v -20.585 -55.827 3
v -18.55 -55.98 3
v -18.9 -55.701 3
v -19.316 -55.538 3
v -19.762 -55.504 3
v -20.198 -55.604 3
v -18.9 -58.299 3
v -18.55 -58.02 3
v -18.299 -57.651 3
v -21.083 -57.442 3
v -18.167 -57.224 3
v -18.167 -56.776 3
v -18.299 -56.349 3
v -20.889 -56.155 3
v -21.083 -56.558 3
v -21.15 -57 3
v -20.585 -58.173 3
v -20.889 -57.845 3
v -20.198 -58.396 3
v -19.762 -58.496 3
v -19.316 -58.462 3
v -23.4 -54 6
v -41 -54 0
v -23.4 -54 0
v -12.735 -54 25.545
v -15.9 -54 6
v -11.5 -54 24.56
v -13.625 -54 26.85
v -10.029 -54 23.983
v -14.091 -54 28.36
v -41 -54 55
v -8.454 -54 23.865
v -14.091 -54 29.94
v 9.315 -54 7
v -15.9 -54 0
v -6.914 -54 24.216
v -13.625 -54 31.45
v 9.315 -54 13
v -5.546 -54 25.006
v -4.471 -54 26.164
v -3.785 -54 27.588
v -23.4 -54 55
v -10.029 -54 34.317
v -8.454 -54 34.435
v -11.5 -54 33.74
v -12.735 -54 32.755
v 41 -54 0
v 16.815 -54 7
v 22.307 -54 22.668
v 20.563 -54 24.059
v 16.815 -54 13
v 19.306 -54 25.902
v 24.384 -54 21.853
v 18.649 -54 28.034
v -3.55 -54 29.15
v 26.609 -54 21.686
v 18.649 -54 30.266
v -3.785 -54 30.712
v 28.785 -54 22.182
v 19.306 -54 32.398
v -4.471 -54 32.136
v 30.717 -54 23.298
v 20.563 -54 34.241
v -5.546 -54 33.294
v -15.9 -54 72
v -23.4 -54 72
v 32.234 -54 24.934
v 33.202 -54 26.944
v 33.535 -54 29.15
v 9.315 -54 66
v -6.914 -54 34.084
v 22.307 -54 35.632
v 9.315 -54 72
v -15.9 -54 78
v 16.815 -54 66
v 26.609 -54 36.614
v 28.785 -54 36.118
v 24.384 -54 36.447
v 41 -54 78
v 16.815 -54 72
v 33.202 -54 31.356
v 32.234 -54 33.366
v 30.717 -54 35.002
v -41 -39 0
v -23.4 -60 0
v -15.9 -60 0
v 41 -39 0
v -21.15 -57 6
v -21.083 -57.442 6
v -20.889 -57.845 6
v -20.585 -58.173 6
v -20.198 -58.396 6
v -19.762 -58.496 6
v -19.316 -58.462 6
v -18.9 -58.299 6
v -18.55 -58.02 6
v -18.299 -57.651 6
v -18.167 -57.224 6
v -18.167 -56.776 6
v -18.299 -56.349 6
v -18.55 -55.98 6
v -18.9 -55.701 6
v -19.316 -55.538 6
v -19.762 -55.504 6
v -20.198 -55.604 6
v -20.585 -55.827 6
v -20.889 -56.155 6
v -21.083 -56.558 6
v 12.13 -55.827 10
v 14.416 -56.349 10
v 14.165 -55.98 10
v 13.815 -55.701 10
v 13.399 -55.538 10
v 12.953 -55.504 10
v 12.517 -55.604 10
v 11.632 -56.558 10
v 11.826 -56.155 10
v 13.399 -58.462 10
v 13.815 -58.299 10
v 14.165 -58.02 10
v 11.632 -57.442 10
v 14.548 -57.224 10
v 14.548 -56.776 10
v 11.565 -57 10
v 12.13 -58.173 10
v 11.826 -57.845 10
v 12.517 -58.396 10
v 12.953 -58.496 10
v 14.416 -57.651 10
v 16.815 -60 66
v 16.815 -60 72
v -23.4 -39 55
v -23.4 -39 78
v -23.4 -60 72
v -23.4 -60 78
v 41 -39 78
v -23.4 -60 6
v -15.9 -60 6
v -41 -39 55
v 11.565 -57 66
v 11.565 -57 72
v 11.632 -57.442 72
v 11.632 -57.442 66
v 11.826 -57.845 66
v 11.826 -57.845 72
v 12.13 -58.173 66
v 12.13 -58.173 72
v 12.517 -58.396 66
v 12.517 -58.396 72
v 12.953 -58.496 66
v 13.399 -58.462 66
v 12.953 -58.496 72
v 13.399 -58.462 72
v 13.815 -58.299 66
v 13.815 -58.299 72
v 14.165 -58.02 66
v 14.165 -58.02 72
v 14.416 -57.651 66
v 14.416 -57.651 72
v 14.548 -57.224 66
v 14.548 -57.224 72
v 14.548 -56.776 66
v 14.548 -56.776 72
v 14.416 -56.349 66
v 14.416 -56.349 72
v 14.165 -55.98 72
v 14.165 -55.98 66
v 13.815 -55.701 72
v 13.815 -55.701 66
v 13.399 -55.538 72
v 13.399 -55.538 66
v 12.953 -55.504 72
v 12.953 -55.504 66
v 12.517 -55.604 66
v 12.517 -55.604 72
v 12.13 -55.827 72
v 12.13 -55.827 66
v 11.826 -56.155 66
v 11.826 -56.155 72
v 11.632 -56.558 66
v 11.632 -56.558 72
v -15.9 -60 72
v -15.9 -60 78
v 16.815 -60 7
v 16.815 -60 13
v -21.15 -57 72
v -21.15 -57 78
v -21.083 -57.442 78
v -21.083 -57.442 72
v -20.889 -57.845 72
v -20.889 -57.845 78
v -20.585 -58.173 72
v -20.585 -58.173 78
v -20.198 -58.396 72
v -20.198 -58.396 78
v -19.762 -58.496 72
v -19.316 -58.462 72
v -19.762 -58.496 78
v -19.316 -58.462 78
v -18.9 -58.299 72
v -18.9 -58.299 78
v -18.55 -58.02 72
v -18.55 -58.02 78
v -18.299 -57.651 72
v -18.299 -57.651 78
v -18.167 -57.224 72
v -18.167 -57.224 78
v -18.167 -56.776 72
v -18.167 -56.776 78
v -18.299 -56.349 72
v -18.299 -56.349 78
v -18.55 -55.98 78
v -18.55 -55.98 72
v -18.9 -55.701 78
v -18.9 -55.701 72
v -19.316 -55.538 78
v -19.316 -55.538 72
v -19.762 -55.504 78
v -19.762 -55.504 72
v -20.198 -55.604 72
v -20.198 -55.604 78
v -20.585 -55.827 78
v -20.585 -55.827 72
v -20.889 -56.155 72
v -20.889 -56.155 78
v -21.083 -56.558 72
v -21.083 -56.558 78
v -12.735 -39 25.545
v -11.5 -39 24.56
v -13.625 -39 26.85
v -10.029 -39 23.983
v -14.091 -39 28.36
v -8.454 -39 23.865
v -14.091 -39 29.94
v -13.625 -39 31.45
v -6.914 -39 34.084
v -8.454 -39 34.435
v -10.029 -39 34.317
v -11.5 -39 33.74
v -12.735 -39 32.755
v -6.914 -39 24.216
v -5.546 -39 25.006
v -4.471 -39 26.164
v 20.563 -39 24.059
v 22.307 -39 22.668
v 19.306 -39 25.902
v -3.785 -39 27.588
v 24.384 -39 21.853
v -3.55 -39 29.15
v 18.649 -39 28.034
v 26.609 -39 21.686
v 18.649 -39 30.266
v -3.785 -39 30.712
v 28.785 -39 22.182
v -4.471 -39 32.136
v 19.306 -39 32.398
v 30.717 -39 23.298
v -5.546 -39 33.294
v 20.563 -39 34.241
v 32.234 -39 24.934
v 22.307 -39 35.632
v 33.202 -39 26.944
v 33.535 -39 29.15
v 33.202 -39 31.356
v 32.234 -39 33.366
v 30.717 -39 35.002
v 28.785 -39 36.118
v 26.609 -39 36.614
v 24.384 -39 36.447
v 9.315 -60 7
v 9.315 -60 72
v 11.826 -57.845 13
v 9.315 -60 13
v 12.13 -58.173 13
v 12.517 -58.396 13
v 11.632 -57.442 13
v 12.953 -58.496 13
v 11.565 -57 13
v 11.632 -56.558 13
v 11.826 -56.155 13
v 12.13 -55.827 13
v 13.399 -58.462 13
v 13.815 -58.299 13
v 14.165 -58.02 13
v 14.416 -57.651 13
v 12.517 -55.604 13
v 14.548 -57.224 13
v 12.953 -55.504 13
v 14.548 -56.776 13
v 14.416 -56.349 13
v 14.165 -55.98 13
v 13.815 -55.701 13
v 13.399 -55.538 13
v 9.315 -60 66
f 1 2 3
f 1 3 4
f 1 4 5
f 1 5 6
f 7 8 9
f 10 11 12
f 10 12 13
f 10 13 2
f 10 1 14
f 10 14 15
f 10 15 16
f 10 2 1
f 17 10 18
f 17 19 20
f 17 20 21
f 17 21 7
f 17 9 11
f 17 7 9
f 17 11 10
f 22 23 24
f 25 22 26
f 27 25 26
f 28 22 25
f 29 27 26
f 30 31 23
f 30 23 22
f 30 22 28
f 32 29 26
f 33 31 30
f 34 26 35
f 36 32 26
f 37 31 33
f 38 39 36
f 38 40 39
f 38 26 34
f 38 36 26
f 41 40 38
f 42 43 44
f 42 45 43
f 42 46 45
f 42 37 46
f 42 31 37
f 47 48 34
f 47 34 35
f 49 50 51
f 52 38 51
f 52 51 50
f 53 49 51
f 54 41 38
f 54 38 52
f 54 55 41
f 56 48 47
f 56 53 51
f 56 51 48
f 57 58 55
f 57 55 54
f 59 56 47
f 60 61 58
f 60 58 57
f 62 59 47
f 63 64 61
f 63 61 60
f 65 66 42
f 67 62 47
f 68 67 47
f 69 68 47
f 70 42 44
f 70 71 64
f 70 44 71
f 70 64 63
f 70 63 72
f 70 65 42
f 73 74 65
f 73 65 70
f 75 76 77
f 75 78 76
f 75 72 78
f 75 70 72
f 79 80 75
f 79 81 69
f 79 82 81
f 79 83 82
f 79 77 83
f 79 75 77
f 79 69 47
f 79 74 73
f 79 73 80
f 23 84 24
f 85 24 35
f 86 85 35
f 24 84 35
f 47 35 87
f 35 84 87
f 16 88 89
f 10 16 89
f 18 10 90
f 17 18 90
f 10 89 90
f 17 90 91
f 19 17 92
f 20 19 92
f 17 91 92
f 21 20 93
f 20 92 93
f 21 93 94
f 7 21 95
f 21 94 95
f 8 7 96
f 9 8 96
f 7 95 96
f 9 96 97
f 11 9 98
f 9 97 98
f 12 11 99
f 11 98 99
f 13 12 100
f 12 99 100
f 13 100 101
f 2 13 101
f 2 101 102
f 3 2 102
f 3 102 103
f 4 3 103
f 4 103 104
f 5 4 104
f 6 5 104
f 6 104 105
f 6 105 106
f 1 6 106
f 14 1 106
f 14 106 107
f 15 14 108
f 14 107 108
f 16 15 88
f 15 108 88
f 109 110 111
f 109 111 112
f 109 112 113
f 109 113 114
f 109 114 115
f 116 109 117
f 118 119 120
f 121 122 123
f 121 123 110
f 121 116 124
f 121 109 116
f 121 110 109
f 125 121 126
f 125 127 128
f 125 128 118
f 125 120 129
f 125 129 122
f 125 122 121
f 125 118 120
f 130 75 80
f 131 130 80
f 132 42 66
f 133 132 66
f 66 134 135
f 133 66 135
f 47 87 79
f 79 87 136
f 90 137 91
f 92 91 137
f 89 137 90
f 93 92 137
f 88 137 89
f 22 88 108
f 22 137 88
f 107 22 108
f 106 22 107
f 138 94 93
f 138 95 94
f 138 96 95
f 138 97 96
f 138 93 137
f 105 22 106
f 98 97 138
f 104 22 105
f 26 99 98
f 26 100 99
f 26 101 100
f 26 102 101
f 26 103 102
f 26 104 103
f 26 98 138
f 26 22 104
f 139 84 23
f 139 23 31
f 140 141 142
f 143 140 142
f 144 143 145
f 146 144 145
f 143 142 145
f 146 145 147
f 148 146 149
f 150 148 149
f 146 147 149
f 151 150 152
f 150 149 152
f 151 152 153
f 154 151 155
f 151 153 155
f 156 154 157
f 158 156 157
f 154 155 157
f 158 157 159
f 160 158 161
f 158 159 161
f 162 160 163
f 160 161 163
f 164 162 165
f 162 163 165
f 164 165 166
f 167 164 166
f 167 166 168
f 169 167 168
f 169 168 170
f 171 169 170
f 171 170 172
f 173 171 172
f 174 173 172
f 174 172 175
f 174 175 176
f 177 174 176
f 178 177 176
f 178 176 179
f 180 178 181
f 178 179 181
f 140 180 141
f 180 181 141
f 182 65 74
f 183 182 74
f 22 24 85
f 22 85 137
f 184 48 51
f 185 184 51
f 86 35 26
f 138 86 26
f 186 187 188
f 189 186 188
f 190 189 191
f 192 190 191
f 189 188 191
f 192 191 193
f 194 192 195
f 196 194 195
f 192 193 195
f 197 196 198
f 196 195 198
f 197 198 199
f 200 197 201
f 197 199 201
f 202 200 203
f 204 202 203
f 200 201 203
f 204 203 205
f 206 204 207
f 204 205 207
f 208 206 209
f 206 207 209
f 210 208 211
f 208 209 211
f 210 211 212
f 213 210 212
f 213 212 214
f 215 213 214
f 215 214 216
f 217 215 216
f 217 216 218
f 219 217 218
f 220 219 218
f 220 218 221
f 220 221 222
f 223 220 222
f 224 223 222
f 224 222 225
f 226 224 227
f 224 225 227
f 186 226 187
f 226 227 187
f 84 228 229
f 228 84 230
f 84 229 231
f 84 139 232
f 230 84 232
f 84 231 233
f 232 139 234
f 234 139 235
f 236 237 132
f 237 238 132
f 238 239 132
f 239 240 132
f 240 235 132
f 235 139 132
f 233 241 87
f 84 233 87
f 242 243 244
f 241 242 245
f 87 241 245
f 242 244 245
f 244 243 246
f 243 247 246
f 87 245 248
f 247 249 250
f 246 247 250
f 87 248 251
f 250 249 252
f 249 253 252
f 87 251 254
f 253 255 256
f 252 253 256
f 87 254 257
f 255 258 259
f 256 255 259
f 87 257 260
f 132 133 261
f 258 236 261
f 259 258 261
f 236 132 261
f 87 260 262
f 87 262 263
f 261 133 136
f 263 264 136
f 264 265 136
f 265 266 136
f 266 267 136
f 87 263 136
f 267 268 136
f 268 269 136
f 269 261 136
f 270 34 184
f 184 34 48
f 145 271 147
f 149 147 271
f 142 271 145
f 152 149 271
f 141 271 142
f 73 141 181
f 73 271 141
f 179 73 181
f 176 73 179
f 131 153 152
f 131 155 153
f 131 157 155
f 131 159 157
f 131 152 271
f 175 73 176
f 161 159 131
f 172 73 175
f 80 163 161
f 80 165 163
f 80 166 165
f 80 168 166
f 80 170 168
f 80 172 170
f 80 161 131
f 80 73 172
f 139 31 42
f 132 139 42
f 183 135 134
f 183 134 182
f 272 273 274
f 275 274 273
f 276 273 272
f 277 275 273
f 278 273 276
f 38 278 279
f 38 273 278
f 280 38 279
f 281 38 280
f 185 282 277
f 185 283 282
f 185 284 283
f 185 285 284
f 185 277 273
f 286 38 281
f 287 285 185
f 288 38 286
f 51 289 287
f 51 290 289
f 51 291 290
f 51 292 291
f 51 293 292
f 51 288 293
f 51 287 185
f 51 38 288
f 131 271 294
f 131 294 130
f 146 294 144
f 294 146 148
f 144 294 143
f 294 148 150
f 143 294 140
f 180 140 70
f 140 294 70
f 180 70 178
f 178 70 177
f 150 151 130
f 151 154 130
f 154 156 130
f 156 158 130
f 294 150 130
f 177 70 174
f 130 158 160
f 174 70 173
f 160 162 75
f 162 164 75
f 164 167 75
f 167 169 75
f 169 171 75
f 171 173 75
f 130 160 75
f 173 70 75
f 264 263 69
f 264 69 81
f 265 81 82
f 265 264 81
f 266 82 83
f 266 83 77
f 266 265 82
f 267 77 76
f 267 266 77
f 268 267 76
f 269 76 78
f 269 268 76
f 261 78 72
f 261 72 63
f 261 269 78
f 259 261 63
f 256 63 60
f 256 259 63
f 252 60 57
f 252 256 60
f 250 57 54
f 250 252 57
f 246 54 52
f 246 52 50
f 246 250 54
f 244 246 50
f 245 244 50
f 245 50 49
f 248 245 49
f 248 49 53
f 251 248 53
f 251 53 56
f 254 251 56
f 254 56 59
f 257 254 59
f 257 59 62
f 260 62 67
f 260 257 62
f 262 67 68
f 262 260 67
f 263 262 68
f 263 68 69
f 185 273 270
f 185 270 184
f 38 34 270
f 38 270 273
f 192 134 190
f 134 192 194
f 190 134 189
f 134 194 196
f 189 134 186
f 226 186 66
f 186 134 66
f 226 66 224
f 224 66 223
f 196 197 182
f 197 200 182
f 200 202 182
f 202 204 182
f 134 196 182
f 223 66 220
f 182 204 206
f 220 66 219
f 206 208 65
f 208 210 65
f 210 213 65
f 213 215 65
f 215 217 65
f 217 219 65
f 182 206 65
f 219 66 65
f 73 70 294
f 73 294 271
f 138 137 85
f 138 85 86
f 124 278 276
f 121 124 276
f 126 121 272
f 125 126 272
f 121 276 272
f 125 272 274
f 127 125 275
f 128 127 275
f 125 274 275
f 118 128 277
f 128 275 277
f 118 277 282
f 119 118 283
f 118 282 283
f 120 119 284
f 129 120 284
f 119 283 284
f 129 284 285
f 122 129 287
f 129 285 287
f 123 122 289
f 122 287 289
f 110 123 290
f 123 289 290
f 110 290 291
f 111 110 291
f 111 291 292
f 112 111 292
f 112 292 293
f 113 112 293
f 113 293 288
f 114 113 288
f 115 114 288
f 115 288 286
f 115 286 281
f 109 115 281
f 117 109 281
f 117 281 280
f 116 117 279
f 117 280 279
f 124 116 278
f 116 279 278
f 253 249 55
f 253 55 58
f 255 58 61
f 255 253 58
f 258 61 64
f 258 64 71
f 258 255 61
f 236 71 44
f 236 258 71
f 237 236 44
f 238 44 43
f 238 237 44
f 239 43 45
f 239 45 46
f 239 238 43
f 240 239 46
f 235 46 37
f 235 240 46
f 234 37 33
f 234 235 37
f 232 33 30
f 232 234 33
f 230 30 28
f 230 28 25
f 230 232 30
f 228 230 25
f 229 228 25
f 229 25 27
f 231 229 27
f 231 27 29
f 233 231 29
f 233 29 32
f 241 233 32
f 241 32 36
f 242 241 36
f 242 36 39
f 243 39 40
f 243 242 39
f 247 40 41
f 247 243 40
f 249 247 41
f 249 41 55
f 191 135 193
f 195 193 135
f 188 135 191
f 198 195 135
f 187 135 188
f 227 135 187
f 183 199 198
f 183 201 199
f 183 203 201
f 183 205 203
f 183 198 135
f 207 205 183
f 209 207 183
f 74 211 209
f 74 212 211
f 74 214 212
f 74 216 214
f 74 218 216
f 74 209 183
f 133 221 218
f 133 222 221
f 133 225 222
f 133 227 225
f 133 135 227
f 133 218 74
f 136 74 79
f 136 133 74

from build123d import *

# Parameters (mm, degrees)
SKETCH011_W     = 82
SKETCH011_H     = 78
SKETCH011_R     = 7.485
SKETCH011_R_2   = 5.3
PAD011_DEPTH    = 15
SKETCH012_W     = 7.5
SKETCH012_H     = 6
PAD012_DEPTH    = 6
SKETCH013_R     = 1.5
POCKET003_DEPTH = 3
SKETCH014_R     = 1.5
POCKET004_DEPTH = 3
SKETCH015_R     = 1.5
POCKET005_DEPTH = 6
SKETCH016_R     = 1.5
POCKET006_DEPTH = 6
SKETCH023_W     = 17.6
SKETCH023_H     = 23
POCKET012_DEPTH = 15.001


with BuildPart() as part:
    # Sketch011 → Pad011 (new body)
    with BuildSketch(Plane.XZ):
        with Locations((0, 39)):
            Rectangle(SKETCH011_W, SKETCH011_H)
        with Locations((26.05, 29.15)):
            Circle(SKETCH011_R, mode=Mode.SUBTRACT)
        with Locations((-8.85, 29.15)):
            Circle(SKETCH011_R_2, mode=Mode.SUBTRACT)
    extrude(amount=PAD011_DEPTH)

    # Sketch012 (on Face8 of Pad011) → Pad012 (join)
    with BuildSketch(Plane.XZ.offset(15)):
        with Locations((-19.65, 3)):
            Rectangle(SKETCH012_W, SKETCH012_H)
        with Locations((-19.65, 75)):
            Rectangle(SKETCH012_W, SKETCH012_H)
        with Locations((13.065, 10)):
            Rectangle(SKETCH012_W, SKETCH012_H)
        with Locations((13.065, 69)):
            Rectangle(SKETCH012_W, SKETCH012_H)
    extrude(amount=PAD012_DEPTH)

    # Sketch013 (on Face11 of Pad012) → Pocket003 (cut)
    with BuildSketch(Plane(origin=(0, 0, 6), x_dir=(-1, 0, 0), z_dir=(0, 0, 1))):
        with Locations((19.65, 18)):
            Circle(SKETCH013_R)
    extrude(amount=-POCKET003_DEPTH, mode=Mode.SUBTRACT)

    # Sketch014 (on Face16 of Pocket003) → Pocket004 (cut)
    with BuildSketch(Plane(origin=(0, 0, 13), x_dir=(-1, 0, 0), z_dir=(0, 0, 1))):
        with Locations((-13.065, 18)):
            Circle(SKETCH014_R)
    extrude(amount=-POCKET004_DEPTH, mode=Mode.SUBTRACT)

    # Sketch015 (on Face6 of Pocket004) → Pocket005 (cut)
    with BuildSketch(Plane(origin=(0, 0, 78), x_dir=(-1, 0, 0), z_dir=(0, 0, 1))):
        with Locations((19.65, 18)):
            Circle(SKETCH015_R)
    extrude(amount=-POCKET005_DEPTH, mode=Mode.SUBTRACT)

    # Sketch016 (on Face20 of Pocket005) → Pocket006 (cut)
    with BuildSketch(Plane(origin=(0, 0, 72), x_dir=(-1, 0, 0), z_dir=(0, 0, 1))):
        with Locations((-13.065, 18)):
            Circle(SKETCH016_R)
    extrude(amount=-POCKET006_DEPTH, mode=Mode.SUBTRACT)

    # Sketch023 (on Face5 of Pocket006) → Pocket012 (cut, through all)
    with BuildSketch(Plane.XZ.offset(15)):
        with Locations((-32.2, 66.5)):
            Rectangle(SKETCH023_W, SKETCH023_H)
    extrude(amount=-POCKET012_DEPTH, mode=Mode.SUBTRACT)


with BuildPart() as part_1:
    # Body002 placement: moved
    add(part.part.moved(Location((0, -39, 0))))


solid = part_1.part
